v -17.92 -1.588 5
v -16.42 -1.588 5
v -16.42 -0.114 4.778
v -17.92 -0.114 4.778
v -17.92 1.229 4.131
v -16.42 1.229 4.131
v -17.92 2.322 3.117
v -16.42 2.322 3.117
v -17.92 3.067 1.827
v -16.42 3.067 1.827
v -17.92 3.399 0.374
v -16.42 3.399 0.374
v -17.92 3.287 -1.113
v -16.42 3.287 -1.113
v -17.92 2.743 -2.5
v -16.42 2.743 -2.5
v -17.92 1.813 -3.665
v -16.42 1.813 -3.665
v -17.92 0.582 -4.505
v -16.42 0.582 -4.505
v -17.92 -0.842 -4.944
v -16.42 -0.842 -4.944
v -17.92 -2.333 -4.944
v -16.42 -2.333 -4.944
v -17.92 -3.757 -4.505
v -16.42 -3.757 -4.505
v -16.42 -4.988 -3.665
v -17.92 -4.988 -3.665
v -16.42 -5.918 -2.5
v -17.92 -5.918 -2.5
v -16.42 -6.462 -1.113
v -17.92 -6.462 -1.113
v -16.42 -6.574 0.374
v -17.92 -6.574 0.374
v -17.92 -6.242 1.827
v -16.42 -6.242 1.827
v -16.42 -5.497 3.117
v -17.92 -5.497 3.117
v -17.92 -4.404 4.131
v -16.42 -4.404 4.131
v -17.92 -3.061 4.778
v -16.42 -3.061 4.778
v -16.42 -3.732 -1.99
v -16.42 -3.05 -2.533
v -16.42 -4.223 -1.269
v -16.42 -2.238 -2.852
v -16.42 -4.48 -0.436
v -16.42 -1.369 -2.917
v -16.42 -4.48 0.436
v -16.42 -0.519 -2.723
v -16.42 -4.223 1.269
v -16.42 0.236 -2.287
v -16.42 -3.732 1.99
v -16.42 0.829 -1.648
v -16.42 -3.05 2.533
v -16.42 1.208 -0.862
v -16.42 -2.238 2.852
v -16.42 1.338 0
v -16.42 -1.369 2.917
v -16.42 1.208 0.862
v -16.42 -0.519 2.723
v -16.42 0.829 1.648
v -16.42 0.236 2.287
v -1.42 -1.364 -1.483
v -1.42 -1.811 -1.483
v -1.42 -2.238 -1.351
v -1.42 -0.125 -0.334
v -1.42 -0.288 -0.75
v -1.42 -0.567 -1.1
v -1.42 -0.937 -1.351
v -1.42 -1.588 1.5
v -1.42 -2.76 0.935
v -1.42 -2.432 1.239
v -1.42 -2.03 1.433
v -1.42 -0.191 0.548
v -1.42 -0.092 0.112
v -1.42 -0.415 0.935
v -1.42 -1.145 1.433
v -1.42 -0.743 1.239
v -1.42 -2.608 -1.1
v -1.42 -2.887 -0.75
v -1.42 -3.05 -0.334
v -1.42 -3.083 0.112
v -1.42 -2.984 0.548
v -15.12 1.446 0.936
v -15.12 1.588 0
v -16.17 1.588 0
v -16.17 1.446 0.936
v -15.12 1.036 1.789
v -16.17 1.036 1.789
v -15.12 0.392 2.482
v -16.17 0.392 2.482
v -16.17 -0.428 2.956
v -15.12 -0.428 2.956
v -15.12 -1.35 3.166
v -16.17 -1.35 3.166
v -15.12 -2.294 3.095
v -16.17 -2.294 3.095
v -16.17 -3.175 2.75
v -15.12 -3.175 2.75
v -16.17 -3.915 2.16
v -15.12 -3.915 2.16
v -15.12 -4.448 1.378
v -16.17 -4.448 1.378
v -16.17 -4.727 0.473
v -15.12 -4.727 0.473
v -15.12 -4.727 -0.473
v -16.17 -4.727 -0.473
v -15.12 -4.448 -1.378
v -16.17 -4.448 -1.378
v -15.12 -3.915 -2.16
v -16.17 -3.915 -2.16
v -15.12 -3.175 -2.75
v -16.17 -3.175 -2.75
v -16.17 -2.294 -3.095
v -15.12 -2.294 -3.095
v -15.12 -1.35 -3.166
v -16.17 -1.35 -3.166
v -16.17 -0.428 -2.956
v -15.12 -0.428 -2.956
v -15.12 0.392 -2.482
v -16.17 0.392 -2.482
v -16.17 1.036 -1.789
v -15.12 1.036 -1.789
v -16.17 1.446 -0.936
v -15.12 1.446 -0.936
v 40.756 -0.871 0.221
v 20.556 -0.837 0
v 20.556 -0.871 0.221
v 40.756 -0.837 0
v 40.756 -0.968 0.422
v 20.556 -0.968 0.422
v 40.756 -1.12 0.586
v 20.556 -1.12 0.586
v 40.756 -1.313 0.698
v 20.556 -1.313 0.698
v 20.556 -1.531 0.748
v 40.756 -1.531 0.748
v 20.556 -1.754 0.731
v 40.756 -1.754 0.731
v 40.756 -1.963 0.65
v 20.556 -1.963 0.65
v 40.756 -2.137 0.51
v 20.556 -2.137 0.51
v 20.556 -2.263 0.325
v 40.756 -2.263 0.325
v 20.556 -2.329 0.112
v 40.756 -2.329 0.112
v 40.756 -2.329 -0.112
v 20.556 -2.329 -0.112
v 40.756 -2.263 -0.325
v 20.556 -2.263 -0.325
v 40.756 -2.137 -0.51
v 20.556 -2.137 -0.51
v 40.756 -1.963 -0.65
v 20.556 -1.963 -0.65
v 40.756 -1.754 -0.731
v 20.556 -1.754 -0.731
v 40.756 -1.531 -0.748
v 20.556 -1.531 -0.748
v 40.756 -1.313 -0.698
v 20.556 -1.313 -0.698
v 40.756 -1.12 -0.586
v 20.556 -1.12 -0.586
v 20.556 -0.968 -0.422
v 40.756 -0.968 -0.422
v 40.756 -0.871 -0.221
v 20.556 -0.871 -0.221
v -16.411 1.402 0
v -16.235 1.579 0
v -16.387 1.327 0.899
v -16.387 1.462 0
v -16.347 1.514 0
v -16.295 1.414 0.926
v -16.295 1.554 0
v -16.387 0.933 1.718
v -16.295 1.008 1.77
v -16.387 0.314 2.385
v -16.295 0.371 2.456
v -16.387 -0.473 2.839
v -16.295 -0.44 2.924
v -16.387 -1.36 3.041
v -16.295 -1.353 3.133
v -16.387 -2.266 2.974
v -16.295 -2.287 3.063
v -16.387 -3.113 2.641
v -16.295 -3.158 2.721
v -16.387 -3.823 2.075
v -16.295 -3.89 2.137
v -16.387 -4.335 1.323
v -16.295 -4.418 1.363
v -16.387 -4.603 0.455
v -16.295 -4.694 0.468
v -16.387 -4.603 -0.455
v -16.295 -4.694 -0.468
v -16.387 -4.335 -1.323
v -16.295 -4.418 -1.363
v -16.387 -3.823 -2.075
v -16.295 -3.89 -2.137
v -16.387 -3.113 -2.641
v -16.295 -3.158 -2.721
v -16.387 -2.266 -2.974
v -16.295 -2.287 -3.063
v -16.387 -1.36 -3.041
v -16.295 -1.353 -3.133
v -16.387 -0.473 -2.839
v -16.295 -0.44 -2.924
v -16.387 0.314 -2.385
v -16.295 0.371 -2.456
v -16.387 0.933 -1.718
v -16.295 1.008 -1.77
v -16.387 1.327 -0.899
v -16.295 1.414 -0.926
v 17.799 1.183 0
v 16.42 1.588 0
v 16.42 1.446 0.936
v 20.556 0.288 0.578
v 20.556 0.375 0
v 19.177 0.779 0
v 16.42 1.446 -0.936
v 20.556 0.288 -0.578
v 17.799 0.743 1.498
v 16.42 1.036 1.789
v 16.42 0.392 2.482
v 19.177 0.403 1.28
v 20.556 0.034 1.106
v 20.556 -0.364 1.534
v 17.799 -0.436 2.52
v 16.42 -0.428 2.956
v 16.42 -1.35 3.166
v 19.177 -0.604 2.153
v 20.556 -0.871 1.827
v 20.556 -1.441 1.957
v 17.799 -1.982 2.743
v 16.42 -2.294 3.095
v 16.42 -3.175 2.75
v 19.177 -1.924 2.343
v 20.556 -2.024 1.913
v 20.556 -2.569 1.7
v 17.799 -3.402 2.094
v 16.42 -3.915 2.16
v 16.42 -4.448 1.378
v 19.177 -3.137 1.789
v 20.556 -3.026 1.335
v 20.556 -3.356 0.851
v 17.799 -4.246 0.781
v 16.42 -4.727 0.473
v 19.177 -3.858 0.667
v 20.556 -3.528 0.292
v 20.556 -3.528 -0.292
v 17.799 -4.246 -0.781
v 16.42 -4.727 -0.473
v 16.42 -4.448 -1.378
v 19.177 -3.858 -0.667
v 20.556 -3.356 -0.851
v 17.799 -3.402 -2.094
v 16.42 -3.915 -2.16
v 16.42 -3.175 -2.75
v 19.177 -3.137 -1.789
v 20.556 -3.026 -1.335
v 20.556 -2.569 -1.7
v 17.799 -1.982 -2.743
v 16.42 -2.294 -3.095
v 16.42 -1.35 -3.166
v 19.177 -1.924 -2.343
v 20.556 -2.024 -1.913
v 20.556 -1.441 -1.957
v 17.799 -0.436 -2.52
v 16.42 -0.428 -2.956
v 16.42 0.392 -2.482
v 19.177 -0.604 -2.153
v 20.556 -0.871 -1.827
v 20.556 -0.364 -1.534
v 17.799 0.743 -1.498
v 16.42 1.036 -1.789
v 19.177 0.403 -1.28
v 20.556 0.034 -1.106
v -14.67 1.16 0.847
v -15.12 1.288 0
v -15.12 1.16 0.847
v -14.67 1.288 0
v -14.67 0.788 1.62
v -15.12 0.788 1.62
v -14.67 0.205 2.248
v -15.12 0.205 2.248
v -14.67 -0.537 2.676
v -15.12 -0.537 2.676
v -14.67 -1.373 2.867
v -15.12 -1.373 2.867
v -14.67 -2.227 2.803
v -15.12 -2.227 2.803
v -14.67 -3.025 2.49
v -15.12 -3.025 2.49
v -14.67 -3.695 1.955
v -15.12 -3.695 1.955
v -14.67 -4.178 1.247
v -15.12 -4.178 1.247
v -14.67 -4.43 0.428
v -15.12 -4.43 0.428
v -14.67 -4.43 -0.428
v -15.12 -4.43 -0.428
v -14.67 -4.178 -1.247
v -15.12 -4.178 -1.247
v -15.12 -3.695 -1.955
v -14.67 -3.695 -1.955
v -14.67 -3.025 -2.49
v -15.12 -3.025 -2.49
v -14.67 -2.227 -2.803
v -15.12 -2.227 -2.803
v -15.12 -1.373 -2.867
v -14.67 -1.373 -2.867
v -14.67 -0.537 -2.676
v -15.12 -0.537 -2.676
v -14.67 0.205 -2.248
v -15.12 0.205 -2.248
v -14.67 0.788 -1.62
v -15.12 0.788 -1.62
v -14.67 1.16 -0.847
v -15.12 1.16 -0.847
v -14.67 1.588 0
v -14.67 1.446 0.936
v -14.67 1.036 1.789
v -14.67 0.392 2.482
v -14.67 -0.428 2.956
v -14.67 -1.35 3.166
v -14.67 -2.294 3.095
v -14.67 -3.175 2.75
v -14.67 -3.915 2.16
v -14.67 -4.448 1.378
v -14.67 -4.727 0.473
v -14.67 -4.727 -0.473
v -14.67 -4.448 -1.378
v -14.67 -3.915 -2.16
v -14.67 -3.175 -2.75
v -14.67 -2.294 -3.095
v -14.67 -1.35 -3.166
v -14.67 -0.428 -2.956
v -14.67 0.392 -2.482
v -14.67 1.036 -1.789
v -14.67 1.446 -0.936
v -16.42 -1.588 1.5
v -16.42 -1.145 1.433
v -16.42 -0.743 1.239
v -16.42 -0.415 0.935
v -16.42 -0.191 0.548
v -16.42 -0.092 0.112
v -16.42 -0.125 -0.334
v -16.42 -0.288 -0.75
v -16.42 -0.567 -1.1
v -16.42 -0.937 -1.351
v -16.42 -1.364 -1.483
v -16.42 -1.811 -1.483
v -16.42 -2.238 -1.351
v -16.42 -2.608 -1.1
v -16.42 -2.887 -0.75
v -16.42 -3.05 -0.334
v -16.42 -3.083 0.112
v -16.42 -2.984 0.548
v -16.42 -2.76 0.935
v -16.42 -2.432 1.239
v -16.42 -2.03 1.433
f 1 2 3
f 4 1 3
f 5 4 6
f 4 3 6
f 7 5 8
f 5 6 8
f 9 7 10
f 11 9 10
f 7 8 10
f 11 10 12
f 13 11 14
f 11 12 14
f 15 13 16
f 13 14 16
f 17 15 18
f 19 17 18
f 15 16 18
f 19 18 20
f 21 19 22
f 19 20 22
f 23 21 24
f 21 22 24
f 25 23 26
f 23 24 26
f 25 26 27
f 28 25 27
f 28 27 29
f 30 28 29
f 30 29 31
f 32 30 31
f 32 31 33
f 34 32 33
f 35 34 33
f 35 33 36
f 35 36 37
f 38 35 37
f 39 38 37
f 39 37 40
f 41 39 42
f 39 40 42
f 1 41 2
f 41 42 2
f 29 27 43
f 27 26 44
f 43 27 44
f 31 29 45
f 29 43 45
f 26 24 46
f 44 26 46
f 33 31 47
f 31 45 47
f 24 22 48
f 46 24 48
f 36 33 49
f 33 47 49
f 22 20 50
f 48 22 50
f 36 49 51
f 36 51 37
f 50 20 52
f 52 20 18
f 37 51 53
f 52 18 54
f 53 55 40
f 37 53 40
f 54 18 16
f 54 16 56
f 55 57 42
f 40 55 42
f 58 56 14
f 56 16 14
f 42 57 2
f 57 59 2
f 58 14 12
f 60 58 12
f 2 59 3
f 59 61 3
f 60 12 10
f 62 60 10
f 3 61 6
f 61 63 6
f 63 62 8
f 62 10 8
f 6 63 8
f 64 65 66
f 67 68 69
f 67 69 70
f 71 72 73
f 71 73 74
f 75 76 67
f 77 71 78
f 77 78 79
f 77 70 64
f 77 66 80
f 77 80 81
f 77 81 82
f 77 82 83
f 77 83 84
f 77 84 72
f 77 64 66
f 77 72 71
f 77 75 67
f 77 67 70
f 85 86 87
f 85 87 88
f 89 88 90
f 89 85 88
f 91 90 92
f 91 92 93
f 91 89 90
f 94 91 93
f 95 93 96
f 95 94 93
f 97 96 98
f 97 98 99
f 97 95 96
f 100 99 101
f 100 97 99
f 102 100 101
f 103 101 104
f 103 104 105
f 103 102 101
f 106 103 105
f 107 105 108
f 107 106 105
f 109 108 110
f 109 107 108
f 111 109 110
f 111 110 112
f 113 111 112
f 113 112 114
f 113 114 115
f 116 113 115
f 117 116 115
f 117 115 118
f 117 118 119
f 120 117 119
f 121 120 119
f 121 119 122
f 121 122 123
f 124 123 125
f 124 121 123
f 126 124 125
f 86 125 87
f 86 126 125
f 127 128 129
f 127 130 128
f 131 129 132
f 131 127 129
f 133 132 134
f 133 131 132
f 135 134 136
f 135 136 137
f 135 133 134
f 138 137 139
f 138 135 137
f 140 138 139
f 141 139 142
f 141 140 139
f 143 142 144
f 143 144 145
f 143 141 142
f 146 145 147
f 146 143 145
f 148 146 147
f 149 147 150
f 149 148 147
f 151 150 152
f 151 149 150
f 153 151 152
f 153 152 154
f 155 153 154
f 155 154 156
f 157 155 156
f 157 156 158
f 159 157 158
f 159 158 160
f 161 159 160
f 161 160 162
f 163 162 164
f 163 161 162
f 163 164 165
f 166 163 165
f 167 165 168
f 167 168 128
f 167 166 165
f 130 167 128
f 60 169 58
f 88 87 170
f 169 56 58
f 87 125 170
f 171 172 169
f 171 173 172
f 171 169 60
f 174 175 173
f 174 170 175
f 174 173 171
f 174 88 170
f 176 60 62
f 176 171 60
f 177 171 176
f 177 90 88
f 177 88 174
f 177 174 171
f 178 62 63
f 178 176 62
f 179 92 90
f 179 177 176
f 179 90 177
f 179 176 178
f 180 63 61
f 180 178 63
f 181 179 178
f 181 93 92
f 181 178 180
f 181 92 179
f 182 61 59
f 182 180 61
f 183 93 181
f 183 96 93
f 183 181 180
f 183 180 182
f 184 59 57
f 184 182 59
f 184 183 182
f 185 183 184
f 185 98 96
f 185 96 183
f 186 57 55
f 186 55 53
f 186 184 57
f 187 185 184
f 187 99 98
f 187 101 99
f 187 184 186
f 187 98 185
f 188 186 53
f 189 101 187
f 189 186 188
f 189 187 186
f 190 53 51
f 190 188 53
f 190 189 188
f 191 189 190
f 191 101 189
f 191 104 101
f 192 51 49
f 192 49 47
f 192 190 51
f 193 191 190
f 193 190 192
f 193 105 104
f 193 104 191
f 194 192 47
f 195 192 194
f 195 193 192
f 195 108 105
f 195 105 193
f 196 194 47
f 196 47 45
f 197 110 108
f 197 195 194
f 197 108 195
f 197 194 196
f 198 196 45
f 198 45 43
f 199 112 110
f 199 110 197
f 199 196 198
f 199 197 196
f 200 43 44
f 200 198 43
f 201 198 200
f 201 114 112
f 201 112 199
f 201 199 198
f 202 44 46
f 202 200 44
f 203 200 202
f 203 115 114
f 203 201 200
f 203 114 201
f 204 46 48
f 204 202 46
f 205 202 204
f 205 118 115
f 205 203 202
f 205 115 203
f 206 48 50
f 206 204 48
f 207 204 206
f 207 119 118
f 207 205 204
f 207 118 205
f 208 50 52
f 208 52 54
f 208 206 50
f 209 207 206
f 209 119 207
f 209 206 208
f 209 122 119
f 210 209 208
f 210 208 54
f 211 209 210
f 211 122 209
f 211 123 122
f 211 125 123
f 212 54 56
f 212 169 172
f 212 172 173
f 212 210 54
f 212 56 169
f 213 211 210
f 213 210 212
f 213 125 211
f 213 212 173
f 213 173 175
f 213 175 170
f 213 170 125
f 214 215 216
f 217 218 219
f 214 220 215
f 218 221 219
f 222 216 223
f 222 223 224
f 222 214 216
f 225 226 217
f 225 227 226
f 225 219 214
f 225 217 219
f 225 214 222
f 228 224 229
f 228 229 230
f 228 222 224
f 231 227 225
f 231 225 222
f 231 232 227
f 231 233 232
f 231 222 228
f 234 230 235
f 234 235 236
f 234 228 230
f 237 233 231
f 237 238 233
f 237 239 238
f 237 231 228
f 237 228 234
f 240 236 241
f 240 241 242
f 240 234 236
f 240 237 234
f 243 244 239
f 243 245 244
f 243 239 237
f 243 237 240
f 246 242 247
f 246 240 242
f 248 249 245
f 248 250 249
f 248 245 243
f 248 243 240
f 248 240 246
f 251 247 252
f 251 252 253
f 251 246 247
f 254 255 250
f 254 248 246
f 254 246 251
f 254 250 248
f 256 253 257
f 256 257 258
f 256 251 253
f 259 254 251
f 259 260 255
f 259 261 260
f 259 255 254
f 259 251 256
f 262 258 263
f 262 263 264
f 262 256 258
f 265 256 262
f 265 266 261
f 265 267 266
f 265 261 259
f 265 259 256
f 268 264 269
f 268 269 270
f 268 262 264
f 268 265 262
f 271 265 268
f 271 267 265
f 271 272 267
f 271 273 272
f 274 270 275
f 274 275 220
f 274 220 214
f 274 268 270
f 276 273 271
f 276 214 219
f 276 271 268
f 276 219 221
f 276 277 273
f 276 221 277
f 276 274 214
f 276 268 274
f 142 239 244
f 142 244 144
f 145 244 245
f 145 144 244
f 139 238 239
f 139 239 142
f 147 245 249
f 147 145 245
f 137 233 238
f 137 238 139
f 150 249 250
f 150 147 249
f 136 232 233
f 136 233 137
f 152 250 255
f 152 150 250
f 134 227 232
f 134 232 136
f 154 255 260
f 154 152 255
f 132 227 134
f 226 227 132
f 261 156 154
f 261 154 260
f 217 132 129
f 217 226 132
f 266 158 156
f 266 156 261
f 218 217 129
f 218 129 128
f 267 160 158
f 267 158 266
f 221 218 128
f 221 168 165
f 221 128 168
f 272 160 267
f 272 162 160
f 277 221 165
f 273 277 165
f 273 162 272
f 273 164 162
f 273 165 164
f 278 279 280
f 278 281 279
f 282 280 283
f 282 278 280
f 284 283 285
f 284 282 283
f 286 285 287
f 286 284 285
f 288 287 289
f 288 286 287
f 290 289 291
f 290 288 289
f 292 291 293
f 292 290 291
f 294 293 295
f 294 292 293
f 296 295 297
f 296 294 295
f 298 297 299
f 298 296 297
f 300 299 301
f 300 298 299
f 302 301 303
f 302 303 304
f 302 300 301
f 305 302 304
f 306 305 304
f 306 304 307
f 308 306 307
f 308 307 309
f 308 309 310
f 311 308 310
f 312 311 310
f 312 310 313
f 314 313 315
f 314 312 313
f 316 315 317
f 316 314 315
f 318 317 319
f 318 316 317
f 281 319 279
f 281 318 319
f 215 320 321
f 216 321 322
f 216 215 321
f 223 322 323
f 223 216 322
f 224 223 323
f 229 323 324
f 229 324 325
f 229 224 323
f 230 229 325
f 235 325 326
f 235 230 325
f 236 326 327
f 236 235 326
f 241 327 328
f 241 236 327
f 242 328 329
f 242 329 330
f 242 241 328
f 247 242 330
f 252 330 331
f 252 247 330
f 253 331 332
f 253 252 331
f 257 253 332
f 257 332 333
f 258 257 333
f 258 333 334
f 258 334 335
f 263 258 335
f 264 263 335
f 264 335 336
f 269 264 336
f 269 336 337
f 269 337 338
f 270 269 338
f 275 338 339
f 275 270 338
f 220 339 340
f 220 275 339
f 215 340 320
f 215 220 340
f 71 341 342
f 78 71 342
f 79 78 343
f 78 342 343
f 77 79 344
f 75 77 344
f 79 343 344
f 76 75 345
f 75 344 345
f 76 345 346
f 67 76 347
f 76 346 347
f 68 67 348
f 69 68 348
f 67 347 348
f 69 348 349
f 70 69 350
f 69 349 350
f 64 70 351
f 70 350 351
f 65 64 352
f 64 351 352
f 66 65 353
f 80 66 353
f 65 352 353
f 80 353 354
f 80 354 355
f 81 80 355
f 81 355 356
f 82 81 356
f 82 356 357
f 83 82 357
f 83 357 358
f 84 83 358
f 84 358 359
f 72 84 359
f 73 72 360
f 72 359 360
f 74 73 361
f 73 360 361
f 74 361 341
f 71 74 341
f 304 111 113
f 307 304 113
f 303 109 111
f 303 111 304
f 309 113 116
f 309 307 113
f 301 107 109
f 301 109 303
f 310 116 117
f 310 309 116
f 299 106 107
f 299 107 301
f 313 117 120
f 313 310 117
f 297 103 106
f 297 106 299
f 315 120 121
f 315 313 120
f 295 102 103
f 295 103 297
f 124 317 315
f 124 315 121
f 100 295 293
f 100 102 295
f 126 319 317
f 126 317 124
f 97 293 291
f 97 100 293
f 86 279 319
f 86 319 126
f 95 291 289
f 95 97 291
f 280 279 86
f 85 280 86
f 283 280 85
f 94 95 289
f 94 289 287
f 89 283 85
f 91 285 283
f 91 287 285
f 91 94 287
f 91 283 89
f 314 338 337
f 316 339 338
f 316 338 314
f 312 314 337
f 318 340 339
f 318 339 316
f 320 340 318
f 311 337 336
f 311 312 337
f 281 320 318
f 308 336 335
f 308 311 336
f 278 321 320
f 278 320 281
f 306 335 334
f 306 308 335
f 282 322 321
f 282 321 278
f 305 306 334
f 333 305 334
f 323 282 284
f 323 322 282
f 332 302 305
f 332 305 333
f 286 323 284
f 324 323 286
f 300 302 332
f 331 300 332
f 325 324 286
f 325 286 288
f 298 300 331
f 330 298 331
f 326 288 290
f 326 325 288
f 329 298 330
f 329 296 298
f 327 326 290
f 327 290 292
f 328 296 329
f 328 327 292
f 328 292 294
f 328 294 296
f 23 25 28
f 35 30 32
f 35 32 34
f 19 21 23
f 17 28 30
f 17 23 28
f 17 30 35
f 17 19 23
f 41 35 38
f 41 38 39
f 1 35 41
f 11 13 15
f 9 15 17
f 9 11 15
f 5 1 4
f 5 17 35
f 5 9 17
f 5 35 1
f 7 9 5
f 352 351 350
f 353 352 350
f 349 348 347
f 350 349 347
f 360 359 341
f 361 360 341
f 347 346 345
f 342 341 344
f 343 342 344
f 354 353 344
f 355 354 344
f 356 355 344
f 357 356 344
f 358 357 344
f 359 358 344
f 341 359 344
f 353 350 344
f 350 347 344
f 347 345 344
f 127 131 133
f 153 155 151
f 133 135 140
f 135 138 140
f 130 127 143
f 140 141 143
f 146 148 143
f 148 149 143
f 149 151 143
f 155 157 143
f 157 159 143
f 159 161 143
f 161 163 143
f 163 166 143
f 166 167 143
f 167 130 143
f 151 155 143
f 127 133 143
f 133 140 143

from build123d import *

# Parameters (mm, degrees)
FILLET1_R           = 0.25
SKETCH2_W           = 20.2
SKETCH2_H           = 0.75
SKETCH3_R           = 1.2125
BOSS_EXTRUDE1_DEPTH = 10
SKETCH4_R           = 1.5
CUT_EXTRUDE1_DEPTH  = 15
SKETCH6_R           = 5
BOSS_EXTRUDE2_DEPTH = 1.5


with BuildPart() as part:
    # Sketch1 → Revolve1 (revolve)
    with BuildSketch(Plane.XY):
        Polygon((16.42, 1.5875), (20.555933238, 0.375), (20.555933238, -0.375), (16.42, -1.5875), (-16.42, -1.5875), (-16.42, 1.5875), (-15.12, 1.5875), (-15.12, 1.2875), (-14.67, 1.2875), (-14.67, 1.5875), align=None)
    revolve(axis=Axis((-16.42, -1.5875, 0), (1, 0, 0)))

    # Fillet1
    fillet1_edges = [part.edges().sort_by_distance(p)[0] for p in [
        (-16.42, -4.7625, 0),
    ]]
    fillet(fillet1_edges, radius=FILLET1_R)



with BuildPart() as body_2:
    # Sketch2 → Revolve2 (revolve)
    with BuildSketch(Plane.XY):
        with Locations((30.655933238, -1.2125)):
            Rectangle(SKETCH2_W, SKETCH2_H)
    revolve(axis=Axis((20.555933238, -1.5875, 0), (1, 0, 0)))


with BuildPart() as part_1:
    add(part.part)

    add(body_2.part)  # Boss-Extrude1 merges body 2
    # Sketch3 → Boss-Extrude1 (add)
    with BuildSketch(Plane(origin=(20.555933238, 0, 0), x_dir=(0, 0, -1), z_dir=(1, 0, 0))):
        with Locations((0, -1.5875)):
            Circle(SKETCH3_R)
    extrude(amount=-BOSS_EXTRUDE1_DEPTH)

    # Sketch4 → Cut-Extrude1 (cut)
    with BuildSketch(Plane.ZY.offset(16.42)):
        with Locations((0, -1.5875)):
            Circle(SKETCH4_R)
    extrude(amount=-CUT_EXTRUDE1_DEPTH, mode=Mode.SUBTRACT)

    # Sketch6 → Boss-Extrude2 (add)
    with BuildSketch(Plane.ZY.offset(16.42)):
        with Locations((0, -1.5875)):
            Circle(SKETCH6_R)
    extrude(amount=BOSS_EXTRUDE2_DEPTH)


solid = part_1.part
